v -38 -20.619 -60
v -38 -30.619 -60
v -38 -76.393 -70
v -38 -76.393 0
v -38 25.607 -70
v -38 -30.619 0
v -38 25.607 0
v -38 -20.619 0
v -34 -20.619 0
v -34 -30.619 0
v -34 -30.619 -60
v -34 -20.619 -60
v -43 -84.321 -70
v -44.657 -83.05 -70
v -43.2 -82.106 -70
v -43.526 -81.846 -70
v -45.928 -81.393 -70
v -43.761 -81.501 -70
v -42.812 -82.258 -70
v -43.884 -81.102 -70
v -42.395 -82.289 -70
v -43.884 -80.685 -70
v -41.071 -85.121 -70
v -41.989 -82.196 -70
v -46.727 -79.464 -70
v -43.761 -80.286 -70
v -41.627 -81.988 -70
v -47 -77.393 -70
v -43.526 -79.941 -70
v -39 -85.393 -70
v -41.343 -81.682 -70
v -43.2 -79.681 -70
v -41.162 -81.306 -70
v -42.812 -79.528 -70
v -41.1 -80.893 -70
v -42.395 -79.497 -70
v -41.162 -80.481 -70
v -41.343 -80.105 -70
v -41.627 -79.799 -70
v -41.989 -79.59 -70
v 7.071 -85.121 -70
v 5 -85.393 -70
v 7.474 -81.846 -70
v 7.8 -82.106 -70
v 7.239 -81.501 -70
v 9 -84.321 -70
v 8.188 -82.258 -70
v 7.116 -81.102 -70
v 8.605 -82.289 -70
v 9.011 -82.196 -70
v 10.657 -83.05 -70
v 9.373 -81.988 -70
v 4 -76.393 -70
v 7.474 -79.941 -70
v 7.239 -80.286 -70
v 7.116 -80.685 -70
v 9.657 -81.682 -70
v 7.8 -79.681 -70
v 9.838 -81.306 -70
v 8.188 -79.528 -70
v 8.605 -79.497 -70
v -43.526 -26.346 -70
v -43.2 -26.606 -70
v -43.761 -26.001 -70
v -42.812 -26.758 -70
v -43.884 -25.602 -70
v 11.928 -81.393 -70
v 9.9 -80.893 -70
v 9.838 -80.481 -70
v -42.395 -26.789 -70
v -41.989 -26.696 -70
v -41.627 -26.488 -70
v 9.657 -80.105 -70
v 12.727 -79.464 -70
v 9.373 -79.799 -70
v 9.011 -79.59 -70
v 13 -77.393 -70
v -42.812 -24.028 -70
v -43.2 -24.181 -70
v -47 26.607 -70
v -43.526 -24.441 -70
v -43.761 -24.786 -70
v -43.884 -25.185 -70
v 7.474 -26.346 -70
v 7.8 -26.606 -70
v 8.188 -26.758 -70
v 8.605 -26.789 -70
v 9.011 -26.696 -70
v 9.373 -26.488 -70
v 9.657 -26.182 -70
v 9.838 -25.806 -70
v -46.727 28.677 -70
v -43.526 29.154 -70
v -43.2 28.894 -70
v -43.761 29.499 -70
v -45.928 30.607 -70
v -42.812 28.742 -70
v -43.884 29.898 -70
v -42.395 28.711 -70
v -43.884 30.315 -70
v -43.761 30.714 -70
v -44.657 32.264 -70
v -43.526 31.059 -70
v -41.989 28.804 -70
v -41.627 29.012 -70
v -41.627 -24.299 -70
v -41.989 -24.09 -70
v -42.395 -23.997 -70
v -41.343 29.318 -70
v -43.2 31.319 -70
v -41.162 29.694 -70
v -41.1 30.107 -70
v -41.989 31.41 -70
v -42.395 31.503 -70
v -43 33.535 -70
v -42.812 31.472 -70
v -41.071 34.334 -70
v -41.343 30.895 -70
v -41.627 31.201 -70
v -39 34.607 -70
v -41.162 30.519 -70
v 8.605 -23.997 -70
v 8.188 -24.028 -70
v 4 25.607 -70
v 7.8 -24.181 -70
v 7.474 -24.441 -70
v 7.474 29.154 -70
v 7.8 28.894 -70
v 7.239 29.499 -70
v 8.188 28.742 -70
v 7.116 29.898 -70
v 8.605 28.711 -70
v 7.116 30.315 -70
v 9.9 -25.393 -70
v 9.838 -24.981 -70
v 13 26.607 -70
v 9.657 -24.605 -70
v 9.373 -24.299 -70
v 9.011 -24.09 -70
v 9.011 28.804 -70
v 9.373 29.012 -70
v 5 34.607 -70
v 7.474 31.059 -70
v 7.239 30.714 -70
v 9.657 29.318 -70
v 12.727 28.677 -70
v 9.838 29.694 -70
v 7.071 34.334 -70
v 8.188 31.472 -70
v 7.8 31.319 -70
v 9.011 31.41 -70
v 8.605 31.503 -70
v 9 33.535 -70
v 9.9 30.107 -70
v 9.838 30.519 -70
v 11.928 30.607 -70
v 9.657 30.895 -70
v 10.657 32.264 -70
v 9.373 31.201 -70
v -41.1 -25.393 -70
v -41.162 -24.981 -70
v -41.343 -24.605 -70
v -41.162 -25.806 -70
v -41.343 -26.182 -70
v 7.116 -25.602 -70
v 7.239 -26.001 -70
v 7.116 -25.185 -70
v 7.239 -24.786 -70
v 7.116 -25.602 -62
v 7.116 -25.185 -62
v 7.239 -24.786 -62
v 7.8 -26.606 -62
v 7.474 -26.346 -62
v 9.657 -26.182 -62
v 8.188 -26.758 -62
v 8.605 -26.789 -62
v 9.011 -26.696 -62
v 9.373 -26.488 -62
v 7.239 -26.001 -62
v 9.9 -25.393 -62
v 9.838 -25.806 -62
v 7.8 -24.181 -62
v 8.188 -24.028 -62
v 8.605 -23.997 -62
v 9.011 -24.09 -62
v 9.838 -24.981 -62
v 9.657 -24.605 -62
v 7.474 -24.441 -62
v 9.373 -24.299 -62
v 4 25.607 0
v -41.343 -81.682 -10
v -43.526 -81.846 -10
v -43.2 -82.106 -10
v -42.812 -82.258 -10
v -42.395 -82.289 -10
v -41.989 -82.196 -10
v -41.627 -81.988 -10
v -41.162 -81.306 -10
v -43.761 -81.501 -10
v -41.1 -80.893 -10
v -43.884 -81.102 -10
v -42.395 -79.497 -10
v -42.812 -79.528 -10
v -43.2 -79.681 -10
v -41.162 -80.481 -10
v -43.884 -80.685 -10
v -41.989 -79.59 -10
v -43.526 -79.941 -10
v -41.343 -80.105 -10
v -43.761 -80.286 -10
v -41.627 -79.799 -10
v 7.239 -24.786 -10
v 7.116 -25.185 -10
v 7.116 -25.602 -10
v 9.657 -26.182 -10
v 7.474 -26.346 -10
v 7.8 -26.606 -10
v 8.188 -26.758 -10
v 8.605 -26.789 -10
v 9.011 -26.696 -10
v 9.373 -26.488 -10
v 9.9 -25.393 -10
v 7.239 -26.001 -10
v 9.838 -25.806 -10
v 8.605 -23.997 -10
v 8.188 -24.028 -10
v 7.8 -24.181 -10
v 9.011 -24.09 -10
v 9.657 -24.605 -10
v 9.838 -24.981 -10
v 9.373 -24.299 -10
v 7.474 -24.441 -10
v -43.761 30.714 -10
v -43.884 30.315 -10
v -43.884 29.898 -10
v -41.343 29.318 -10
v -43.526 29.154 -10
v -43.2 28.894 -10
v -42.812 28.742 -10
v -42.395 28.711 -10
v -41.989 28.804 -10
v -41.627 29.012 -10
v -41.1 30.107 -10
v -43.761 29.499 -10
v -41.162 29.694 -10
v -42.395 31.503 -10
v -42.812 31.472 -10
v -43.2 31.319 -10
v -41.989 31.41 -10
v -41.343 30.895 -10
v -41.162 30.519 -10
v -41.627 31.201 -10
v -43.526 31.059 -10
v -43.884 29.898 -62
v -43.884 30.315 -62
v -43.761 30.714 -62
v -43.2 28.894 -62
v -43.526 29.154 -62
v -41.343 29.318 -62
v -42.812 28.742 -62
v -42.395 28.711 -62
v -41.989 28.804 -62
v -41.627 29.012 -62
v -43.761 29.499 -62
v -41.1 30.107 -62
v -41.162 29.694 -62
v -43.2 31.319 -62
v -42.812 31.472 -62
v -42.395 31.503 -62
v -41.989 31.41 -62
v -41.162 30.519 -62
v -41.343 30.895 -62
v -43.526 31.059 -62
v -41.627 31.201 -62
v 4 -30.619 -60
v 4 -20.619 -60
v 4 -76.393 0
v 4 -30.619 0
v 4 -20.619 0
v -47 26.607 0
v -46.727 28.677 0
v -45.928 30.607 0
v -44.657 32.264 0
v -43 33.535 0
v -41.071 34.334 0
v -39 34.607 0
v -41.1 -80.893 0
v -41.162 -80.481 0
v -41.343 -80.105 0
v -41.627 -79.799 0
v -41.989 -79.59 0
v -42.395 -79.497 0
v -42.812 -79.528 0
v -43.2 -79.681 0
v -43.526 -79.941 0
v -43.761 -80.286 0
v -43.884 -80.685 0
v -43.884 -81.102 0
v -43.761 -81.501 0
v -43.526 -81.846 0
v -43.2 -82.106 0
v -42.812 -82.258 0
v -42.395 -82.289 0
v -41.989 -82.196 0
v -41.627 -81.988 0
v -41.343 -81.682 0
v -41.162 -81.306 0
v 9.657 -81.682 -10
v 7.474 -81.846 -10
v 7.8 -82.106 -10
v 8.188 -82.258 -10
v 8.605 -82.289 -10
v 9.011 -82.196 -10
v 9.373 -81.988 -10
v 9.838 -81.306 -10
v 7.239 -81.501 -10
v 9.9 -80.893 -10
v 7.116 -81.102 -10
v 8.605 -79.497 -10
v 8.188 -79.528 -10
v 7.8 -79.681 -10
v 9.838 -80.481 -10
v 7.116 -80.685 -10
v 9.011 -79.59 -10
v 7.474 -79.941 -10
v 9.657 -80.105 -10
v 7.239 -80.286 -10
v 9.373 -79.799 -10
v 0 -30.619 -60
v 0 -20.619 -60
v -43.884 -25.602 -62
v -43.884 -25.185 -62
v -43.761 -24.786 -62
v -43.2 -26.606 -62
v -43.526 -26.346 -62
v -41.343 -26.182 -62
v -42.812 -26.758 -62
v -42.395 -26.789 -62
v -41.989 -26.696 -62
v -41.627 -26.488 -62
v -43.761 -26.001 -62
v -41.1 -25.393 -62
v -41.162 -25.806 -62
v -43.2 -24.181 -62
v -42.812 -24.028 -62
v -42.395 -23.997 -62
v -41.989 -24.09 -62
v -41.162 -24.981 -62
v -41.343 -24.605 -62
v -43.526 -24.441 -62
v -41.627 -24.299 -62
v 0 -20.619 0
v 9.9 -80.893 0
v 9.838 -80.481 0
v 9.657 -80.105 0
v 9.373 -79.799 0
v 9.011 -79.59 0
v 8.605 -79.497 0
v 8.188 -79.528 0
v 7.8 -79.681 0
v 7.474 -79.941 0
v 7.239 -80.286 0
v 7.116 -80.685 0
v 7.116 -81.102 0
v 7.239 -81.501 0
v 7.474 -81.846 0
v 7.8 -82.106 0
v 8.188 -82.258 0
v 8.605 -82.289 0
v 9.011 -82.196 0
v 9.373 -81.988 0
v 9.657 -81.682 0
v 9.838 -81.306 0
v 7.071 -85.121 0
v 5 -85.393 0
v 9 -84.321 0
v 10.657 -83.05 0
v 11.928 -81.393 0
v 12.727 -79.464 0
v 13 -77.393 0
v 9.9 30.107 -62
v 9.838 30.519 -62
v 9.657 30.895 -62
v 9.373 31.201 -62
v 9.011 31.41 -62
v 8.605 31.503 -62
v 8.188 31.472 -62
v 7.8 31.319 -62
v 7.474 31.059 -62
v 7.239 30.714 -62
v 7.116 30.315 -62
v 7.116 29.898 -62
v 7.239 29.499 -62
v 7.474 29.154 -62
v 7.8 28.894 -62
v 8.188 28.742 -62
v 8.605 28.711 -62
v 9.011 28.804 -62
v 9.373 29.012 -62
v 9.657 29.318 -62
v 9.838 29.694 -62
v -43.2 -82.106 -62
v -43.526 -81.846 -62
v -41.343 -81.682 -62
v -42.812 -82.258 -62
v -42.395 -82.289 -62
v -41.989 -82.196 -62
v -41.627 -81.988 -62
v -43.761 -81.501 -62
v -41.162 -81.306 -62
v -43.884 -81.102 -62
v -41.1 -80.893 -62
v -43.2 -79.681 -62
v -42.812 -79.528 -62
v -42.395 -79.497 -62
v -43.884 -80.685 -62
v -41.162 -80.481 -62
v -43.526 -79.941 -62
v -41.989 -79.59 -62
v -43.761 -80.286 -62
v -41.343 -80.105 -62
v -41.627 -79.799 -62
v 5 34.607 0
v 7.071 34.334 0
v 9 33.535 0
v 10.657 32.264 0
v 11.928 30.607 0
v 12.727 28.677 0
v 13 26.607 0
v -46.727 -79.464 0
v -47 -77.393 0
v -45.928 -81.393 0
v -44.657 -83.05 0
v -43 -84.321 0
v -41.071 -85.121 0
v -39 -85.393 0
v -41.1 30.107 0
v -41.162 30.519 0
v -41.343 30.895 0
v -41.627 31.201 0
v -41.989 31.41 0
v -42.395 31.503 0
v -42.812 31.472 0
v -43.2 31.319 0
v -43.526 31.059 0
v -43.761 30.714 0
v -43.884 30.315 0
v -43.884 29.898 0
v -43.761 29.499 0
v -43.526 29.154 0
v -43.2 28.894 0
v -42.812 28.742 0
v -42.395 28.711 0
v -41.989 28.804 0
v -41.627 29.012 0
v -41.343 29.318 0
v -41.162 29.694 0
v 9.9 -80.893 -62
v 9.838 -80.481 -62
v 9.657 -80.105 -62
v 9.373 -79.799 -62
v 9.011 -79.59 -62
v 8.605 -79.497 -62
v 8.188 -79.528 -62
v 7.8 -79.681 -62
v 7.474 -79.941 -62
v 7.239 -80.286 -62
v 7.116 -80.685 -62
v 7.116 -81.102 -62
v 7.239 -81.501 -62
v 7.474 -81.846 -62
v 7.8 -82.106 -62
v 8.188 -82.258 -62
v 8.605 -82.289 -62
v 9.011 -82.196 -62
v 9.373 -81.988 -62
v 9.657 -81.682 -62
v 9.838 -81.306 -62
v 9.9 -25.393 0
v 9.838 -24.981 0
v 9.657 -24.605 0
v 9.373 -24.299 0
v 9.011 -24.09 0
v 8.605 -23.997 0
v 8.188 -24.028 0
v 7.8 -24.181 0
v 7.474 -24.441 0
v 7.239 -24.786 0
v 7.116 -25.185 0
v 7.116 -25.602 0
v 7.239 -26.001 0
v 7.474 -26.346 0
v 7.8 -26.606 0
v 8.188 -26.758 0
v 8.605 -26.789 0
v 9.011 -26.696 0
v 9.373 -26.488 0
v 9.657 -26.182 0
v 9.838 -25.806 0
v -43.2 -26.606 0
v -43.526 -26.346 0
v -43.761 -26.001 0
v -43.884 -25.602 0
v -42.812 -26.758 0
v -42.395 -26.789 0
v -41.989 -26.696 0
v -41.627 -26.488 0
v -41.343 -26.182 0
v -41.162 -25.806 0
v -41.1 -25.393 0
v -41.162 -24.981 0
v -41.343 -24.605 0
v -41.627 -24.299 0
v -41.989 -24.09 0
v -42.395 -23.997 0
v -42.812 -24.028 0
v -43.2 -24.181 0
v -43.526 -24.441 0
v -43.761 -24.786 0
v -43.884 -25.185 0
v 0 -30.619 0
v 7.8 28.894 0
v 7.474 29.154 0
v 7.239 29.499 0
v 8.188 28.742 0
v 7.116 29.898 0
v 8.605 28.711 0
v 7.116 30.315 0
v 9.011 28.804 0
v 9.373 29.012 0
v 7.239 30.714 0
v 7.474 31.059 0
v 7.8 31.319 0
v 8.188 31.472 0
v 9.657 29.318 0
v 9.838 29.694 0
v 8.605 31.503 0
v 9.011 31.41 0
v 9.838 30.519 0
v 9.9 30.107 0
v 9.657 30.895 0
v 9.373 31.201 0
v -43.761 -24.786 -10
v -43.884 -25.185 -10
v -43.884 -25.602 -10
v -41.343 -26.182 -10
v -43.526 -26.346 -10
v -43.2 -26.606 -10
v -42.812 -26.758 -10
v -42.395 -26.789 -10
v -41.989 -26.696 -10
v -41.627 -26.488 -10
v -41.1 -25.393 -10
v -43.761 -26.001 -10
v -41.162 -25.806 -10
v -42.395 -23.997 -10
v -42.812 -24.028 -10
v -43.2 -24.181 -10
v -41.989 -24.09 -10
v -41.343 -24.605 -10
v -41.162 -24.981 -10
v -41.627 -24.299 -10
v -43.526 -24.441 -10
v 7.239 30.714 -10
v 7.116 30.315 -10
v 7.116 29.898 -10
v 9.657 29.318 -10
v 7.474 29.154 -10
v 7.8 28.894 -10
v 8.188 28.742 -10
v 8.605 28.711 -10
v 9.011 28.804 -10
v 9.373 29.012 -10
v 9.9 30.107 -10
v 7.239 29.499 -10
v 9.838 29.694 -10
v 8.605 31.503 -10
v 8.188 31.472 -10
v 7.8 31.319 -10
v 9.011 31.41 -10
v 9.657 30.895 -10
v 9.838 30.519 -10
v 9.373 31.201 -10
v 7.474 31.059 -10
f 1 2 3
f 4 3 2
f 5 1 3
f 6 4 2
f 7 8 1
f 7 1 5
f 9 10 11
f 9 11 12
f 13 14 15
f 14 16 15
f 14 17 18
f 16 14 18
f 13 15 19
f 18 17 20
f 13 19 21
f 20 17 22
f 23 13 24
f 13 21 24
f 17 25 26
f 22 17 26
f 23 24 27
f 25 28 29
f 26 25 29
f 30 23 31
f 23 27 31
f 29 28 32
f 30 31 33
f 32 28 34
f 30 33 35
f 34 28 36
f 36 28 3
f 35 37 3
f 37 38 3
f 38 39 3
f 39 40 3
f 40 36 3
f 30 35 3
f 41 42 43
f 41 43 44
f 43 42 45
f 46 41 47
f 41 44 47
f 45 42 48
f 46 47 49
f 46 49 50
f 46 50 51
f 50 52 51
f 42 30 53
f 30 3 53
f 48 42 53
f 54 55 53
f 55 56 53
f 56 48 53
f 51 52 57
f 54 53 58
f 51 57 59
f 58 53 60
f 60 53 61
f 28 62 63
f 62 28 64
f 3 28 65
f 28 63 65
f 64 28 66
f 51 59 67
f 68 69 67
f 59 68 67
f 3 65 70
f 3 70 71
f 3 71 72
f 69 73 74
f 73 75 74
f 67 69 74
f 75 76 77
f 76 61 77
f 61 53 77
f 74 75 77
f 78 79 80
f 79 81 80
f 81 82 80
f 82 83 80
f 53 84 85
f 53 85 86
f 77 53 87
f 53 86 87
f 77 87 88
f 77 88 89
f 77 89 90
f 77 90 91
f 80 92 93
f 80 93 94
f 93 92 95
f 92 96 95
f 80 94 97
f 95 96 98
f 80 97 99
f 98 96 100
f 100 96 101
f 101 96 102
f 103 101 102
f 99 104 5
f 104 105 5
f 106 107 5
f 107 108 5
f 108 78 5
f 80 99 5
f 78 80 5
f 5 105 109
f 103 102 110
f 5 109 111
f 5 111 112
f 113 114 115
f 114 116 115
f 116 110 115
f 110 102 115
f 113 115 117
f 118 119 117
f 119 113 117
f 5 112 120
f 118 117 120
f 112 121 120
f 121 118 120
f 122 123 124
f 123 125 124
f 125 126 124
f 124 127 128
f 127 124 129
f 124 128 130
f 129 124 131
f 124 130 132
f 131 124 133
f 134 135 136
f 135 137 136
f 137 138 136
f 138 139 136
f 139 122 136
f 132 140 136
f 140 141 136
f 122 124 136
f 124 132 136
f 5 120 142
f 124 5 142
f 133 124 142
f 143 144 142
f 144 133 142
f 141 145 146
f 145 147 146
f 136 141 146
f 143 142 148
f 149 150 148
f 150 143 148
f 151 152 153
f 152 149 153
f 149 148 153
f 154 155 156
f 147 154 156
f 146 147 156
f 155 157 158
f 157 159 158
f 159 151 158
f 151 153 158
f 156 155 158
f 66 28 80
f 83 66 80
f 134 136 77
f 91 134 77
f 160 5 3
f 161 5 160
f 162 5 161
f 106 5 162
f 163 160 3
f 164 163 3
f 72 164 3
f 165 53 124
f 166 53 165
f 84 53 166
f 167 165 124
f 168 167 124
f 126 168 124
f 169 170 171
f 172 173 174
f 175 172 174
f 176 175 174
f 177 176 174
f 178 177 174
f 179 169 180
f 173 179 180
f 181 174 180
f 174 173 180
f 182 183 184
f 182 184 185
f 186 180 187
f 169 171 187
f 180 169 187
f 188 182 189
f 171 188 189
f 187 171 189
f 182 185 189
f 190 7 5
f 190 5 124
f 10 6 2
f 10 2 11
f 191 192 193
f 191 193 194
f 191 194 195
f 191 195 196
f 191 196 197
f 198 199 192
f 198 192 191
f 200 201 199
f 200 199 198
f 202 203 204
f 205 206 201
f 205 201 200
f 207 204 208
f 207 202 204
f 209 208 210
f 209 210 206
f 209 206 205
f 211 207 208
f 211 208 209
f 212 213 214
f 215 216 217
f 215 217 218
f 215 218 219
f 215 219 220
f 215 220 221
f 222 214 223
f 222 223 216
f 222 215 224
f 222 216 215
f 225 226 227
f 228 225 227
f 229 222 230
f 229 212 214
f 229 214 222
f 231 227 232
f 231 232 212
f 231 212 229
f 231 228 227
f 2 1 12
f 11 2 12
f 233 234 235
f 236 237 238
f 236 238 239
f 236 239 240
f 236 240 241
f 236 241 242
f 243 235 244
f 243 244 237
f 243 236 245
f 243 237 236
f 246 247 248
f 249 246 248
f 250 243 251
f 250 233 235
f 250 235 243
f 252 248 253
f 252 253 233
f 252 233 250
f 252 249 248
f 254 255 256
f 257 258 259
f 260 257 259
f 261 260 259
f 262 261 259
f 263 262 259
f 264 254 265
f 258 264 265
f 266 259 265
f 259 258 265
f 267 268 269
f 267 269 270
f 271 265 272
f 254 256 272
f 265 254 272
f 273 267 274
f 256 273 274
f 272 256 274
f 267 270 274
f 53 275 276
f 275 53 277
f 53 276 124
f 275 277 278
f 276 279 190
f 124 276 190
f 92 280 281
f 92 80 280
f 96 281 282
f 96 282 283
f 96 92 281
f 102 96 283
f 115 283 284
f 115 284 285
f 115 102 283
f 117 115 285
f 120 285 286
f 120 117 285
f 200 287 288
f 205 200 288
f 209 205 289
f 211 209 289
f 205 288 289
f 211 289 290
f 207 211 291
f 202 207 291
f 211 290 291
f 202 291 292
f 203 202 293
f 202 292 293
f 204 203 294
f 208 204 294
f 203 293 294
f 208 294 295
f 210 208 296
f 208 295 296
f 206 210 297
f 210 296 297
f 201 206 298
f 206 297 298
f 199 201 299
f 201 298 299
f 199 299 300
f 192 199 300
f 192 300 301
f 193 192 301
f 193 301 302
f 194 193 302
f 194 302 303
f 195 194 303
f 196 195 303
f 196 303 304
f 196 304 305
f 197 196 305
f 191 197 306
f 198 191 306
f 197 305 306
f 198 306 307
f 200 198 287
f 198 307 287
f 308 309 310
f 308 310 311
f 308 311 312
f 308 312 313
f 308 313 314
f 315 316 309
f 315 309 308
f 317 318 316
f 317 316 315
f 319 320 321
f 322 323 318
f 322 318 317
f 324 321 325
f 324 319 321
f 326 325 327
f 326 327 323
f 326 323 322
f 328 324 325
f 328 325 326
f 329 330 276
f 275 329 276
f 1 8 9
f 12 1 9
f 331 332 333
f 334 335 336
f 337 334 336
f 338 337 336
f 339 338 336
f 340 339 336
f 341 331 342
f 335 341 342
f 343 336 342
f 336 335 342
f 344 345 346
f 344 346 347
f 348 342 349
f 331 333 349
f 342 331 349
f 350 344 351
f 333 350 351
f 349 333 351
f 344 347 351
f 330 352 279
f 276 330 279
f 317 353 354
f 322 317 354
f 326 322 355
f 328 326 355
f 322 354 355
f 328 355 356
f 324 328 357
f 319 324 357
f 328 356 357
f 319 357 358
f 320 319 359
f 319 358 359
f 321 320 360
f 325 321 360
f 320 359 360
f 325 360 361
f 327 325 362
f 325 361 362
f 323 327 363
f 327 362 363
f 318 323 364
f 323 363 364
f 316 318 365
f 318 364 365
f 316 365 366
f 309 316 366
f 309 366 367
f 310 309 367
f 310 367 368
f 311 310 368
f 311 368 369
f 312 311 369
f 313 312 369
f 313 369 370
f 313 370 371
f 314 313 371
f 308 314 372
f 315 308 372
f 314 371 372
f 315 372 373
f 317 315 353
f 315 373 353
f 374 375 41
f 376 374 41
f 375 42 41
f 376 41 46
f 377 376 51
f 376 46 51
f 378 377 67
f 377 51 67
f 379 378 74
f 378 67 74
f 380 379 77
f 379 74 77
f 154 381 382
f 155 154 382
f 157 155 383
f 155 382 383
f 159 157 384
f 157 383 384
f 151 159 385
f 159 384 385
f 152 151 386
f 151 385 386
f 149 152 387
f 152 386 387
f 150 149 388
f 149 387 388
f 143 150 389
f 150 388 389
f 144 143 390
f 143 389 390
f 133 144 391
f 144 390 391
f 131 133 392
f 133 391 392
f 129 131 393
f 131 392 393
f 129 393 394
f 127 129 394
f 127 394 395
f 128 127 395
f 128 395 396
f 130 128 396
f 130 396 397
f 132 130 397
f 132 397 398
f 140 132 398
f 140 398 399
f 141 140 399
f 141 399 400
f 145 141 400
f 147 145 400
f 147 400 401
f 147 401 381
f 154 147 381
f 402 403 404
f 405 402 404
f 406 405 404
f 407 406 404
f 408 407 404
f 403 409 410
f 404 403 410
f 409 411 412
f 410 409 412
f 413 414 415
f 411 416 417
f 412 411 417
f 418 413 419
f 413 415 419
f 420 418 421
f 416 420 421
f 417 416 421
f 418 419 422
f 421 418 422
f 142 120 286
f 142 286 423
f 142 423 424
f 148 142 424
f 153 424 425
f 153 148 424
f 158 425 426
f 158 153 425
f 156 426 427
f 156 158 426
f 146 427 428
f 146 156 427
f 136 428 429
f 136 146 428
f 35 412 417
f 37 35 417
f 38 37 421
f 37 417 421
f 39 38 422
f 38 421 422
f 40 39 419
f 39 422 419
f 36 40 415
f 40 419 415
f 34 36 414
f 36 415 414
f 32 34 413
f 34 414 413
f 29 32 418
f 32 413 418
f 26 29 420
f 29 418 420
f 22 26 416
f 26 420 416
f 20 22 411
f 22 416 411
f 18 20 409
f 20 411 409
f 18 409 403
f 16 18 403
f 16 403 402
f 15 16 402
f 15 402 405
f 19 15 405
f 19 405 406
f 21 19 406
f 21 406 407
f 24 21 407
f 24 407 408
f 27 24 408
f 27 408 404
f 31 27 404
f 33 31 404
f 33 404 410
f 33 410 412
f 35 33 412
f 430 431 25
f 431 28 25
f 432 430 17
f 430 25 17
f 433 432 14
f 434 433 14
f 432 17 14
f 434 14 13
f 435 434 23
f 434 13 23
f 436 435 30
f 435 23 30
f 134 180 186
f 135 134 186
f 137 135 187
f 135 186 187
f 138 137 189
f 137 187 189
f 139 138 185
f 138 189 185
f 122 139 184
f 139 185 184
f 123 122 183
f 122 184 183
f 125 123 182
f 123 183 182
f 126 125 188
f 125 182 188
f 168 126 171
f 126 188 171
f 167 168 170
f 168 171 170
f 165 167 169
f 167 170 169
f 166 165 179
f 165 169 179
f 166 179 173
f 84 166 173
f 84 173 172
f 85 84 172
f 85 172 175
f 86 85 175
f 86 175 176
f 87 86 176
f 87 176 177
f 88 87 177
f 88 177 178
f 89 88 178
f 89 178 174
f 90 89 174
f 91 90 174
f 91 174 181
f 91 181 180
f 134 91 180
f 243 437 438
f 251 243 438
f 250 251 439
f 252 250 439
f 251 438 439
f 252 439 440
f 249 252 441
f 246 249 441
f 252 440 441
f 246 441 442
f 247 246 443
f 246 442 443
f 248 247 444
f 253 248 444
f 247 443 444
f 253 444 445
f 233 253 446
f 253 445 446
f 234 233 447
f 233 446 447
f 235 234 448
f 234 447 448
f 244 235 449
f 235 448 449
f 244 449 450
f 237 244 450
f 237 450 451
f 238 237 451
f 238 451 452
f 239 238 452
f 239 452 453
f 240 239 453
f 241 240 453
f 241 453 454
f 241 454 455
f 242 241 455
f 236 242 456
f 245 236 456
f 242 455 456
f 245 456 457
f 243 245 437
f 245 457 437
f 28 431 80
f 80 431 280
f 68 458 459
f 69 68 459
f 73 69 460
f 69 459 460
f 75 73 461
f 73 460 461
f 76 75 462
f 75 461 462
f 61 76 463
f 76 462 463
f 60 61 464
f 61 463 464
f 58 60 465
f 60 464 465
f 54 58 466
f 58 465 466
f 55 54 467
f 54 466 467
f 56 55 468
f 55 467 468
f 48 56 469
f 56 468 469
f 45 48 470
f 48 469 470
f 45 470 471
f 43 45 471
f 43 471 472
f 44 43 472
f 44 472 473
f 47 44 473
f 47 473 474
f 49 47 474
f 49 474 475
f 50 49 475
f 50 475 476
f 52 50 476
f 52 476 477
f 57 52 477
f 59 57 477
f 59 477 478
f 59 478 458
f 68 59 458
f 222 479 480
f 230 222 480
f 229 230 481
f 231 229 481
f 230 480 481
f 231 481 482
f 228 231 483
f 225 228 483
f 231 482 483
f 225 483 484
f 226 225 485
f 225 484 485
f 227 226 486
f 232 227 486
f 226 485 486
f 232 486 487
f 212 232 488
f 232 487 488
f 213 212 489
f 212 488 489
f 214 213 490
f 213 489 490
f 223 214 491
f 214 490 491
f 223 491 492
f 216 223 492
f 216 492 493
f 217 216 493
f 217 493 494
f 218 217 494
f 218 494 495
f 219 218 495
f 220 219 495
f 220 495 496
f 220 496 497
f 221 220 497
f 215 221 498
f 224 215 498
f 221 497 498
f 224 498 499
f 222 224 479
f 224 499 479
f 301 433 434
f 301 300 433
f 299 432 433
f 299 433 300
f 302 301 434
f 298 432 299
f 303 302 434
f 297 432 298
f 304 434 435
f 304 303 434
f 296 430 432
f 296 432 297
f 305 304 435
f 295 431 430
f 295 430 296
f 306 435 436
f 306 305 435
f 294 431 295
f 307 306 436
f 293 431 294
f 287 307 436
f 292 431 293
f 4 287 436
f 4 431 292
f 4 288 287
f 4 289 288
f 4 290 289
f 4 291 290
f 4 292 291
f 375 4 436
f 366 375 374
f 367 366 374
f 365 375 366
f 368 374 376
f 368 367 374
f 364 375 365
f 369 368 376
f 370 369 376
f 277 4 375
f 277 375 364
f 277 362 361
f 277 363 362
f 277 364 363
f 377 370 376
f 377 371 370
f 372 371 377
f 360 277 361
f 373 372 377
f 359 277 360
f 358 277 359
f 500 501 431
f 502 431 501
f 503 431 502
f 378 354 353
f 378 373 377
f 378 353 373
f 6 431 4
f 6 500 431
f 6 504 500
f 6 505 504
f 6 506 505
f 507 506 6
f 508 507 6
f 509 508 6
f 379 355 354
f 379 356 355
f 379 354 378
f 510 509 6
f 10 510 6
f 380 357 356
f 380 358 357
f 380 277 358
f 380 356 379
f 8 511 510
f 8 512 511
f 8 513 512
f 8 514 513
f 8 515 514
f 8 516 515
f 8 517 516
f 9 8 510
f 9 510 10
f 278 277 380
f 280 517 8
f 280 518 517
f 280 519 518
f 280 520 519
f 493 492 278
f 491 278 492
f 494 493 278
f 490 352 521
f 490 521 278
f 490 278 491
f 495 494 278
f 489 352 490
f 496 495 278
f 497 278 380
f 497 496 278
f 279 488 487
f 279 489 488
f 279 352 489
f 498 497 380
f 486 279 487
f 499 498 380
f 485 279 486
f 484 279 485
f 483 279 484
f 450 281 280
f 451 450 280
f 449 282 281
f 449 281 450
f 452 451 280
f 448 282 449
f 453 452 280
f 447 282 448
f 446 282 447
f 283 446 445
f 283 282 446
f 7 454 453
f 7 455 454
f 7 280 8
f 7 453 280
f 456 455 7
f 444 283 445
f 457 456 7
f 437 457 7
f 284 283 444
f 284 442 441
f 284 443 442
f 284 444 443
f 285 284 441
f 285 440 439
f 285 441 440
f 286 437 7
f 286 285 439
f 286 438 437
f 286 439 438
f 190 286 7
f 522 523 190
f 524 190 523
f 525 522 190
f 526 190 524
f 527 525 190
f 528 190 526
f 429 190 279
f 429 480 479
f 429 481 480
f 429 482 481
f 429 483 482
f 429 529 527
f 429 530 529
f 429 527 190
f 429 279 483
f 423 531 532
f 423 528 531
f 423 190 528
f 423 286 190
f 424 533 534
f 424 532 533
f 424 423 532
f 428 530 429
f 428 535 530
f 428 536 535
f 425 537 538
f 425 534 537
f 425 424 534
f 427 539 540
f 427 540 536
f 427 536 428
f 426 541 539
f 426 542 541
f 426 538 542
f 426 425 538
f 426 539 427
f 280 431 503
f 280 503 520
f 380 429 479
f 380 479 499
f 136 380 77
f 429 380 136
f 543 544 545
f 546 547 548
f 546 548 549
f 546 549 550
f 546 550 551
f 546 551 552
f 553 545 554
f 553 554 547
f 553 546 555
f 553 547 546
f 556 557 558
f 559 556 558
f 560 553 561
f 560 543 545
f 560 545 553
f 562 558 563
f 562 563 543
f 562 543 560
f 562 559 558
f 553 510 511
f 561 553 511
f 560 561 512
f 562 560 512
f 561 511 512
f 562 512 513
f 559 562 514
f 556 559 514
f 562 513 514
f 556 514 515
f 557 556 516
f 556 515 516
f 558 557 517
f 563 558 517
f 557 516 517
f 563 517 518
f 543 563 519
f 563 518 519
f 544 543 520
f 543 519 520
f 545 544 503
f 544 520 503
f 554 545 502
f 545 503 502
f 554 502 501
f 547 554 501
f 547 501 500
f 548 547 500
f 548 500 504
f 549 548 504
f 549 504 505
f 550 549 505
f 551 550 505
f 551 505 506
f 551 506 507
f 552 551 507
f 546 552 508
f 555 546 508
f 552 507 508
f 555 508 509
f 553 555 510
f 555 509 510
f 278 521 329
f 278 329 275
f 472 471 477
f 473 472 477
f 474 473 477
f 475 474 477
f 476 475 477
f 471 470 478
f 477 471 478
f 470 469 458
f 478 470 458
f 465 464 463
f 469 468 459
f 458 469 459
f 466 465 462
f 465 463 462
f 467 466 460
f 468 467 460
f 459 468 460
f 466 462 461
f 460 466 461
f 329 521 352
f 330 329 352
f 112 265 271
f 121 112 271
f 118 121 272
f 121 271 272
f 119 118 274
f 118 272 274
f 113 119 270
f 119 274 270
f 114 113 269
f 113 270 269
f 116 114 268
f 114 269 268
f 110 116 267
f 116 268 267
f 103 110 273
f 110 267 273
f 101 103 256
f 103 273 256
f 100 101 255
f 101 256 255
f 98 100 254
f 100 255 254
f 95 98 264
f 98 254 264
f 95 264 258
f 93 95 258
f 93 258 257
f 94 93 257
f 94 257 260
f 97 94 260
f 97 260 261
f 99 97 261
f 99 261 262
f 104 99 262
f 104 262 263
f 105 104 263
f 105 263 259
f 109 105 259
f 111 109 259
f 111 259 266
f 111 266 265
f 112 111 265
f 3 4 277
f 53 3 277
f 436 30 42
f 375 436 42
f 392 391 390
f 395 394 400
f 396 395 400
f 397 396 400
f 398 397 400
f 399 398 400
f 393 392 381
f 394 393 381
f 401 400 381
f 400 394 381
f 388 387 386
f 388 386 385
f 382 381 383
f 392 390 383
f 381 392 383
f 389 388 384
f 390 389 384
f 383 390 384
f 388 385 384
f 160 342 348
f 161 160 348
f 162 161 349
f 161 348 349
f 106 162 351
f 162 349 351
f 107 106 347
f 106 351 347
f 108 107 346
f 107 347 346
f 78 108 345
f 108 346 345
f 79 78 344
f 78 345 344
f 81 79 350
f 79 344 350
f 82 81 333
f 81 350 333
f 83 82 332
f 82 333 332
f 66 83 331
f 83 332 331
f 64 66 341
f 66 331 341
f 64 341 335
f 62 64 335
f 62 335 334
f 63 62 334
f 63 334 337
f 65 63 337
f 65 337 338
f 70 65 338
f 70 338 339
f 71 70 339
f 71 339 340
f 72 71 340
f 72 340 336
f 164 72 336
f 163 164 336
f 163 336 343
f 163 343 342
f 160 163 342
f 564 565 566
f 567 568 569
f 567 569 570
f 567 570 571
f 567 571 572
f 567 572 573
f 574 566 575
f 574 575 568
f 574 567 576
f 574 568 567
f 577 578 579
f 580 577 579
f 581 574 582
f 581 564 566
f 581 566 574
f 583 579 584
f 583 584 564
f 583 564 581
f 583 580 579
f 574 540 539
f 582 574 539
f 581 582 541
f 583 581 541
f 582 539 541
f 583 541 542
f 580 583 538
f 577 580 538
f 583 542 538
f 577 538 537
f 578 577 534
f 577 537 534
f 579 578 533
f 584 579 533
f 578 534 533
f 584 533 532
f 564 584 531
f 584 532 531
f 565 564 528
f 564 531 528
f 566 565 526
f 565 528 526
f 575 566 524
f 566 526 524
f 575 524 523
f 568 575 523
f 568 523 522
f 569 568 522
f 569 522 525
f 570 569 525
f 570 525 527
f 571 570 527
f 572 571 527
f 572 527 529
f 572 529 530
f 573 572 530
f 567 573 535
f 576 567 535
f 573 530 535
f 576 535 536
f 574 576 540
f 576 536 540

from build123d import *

# Parameters (mm, degrees)
SKETCH1_W           = 60
SKETCH1_H           = 120
SKETCH1_R           = 1.4
BOSS_EXTRUDE1_DEPTH = 70
SKETCH1_5_W         = 4
SKETCH1_5_H         = 10
BOSS_EXTRUDE3_DEPTH = 60
SKETCH1_7_R         = 1.4
BOSS_EXTRUDE5_DEPTH = 62
SKETCH1_8_R         = 1.4
CUT_EXTRUDE1_DEPTH  = 10
FILLET1_R           = 8


with BuildPart() as part:
    # Sketch1 → Boss-Extrude1 (new body)
    with BuildSketch(Plane.XY):
        with Locations((-17, -25.393258427)):
            Rectangle(SKETCH1_W, SKETCH1_H)
        with Locations((-42.5, -80.893258427)):
            Circle(SKETCH1_R, mode=Mode.SUBTRACT)
        with Locations((-42.5, -25.393258427)):
            Circle(SKETCH1_R, mode=Mode.SUBTRACT)
        Polygon((-38, -30.618851522), (-38, -20.618851522), (-38, 25.606741573), (4, 25.606741573), (4, -20.618851522), (4, -30.618851522), (4, -76.393258427), (-38, -76.393258427), align=None, mode=Mode.SUBTRACT)
        with Locations((8.5, -80.893258427)):
            Circle(SKETCH1_R, mode=Mode.SUBTRACT)
        with Locations((8.5, -25.393258427)):
            Circle(SKETCH1_R, mode=Mode.SUBTRACT)
        with Locations((-42.5, 30.106741573)):
            Circle(SKETCH1_R, mode=Mode.SUBTRACT)
        with Locations((8.5, 30.106741573)):
            Circle(SKETCH1_R, mode=Mode.SUBTRACT)
    extrude(amount=-BOSS_EXTRUDE1_DEPTH)

    # Sketch1<5> → Boss-Extrude3 (add)
    with BuildSketch(Plane.XY):
        with Locations((-36, -25.618851522)):
            Rectangle(SKETCH1_5_W, SKETCH1_5_H)
        with Locations((2, -25.618851522)):
            Rectangle(SKETCH1_5_W, SKETCH1_5_H)
    extrude(amount=-BOSS_EXTRUDE3_DEPTH)

    # Sketch1<7> → Boss-Extrude5 (add)
    with BuildSketch(Plane.XY):
        with Locations((8.5, 30.106741573)):
            Circle(SKETCH1_7_R)
        with Locations((-42.5, 30.106741573)):
            Circle(SKETCH1_7_R)
        with Locations((-42.5, -80.893258427)):
            Circle(SKETCH1_7_R)
        with Locations((8.5, -80.893258427)):
            Circle(SKETCH1_7_R)
        with Locations((-42.5, -25.393258427)):
            Circle(SKETCH1_7_R)
        with Locations((8.5, -25.393258427)):
            Circle(SKETCH1_7_R)
    extrude(amount=-BOSS_EXTRUDE5_DEPTH)

    # Sketch1<8> → Cut-Extrude1 (cut)
    with BuildSketch(Plane.XY):
        with Locations((8.5, 30.106741573)):
            Circle(SKETCH1_8_R)
        with Locations((-42.5, 30.106741573)):
            Circle(SKETCH1_8_R)
        with Locations((-42.5, -80.893258427)):
            Circle(SKETCH1_8_R)
        with Locations((8.5, -80.893258427)):
            Circle(SKETCH1_8_R)
        with Locations((-42.5, -25.393258427)):
            Circle(SKETCH1_8_R)
        with Locations((8.5, -25.393258427)):
            Circle(SKETCH1_8_R)
    extrude(amount=-CUT_EXTRUDE1_DEPTH, mode=Mode.SUBTRACT)

    # Fillet1
    fillet1_edges = [part.edges().sort_by_distance(p)[0] for p in [
        (13, -85.393258427, -35),
        (-47, -85.393258427, -35),
        (-47, 34.606741573, -35),
        (13, 34.606741573, -35),
    ]]
    fillet(fillet1_edges, radius=FILLET1_R)


solid = part.part
